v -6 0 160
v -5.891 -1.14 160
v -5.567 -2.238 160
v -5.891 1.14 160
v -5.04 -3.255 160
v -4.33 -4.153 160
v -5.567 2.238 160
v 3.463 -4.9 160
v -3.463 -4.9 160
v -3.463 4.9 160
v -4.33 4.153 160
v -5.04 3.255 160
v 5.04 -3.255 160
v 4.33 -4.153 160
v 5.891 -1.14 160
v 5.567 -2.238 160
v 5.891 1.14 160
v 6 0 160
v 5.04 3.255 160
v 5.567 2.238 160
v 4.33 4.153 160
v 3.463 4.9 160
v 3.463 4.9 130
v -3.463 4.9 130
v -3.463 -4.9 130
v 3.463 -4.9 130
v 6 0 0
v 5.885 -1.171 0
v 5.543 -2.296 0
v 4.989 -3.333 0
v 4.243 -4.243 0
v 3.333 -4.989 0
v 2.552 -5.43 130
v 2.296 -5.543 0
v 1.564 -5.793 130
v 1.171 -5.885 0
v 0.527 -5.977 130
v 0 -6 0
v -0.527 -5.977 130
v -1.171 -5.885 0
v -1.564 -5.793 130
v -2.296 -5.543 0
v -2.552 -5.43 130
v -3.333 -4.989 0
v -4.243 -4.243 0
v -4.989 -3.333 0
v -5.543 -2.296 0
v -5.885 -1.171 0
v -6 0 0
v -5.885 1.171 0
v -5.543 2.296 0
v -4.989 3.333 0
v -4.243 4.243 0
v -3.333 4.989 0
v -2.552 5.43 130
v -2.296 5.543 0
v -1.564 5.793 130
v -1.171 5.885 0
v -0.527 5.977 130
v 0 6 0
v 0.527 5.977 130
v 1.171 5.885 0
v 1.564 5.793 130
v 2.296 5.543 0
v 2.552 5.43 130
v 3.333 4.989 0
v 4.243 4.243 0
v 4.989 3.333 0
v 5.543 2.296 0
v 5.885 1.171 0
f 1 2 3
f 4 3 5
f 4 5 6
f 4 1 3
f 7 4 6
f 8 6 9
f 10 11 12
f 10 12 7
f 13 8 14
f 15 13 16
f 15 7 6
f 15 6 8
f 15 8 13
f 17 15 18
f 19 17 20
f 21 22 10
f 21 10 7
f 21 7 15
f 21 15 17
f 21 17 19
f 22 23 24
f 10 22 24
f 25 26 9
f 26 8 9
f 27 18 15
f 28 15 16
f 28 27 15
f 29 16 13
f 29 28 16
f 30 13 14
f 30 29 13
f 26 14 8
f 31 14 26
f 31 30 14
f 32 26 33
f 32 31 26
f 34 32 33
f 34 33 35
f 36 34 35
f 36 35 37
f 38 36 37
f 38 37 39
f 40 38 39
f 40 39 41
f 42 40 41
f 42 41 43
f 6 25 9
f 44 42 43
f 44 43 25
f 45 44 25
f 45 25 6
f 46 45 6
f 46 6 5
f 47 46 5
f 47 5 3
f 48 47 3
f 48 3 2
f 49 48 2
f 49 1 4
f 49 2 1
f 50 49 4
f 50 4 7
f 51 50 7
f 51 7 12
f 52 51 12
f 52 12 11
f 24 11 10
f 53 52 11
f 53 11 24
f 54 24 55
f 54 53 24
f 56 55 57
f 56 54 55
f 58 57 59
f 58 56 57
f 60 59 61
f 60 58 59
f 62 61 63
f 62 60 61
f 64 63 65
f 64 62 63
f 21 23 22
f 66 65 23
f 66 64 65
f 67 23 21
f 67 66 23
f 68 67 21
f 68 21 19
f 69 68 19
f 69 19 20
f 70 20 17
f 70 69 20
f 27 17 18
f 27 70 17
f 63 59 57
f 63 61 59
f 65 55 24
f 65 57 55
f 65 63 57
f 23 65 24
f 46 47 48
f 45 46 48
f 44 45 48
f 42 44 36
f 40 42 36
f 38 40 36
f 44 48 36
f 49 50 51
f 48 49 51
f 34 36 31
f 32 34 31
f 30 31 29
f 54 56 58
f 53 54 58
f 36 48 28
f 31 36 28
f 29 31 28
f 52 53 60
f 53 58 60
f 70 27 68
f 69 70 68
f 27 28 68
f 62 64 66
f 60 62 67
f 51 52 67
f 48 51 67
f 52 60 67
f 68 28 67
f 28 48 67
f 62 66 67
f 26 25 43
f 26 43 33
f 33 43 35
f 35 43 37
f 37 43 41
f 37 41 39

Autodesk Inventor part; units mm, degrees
ref_plane "YZ Plane" through (0, 0, 0) normal (1, 0, 0) x (0, 1, 0)
ref_plane "XZ Plane" through (0, 0, 0) normal (0, 1, 0) x (-1, 0, 0)
ref_plane "XY Plane" through (0, 0, 0) normal (0, 0, 1) x (1, 0, 0)
sketch "Sketch1" plane through (0, 0, 0) normal (0, 0, 1) x (1, 0, 0)
  circle A0 centre (0, 0) radius 6
  dimension "d0" = 12
extrude "Extrusion1" add sketch "Sketch1" along normal blind 160
sketch "Sketch2" plane through (0, 0, 160) normal (0, 0, 1) x (1, 0, 0)
  arc A0 (-3.4627, 4.9) -> (-3.4627, -4.9) centre (0, 0) ccw
  line L0 (-3.4627, 4.9) -> (3.4627, 4.9)
  arc A1 (3.4627, -4.9) -> (3.4627, 4.9) centre (0, 0) ccw
  line L1 (3.4627, -4.9) -> (-3.4627, -4.9)
  line L2 (-4.1729, 7.0025) -> (4.0866, 7.0025)
  line L3 (4.0866, 7.0025) -> (4.0866, 4.9)
  line L4 (4.0866, 4.9) -> (-4.1729, 4.9)
  line L5 (-4.1729, 4.9) -> (-4.1729, 7.0025)
  line L6 (-3.9468, -4.9) -> (4.2356, -4.9)
  line L7 (4.2356, -4.9) -> (4.2356, -6.7965)
  line L8 (4.2356, -6.7965) -> (-3.9468, -6.7965)
  line L9 (-3.9468, -6.7965) -> (-3.9468, -4.9)
  point P0 (-3.4627, 4.9)
  point P1 (3.4627, -4.9)
  point P2 (-3.4627, -4.9)
extrude "Extrusion2" cut sketch "Sketch2" against normal blind 30 contours L4 L5 L2 L3 L0 | L1 L6 L7 L8 L9
properties part number "oś napędowa 12mm"
